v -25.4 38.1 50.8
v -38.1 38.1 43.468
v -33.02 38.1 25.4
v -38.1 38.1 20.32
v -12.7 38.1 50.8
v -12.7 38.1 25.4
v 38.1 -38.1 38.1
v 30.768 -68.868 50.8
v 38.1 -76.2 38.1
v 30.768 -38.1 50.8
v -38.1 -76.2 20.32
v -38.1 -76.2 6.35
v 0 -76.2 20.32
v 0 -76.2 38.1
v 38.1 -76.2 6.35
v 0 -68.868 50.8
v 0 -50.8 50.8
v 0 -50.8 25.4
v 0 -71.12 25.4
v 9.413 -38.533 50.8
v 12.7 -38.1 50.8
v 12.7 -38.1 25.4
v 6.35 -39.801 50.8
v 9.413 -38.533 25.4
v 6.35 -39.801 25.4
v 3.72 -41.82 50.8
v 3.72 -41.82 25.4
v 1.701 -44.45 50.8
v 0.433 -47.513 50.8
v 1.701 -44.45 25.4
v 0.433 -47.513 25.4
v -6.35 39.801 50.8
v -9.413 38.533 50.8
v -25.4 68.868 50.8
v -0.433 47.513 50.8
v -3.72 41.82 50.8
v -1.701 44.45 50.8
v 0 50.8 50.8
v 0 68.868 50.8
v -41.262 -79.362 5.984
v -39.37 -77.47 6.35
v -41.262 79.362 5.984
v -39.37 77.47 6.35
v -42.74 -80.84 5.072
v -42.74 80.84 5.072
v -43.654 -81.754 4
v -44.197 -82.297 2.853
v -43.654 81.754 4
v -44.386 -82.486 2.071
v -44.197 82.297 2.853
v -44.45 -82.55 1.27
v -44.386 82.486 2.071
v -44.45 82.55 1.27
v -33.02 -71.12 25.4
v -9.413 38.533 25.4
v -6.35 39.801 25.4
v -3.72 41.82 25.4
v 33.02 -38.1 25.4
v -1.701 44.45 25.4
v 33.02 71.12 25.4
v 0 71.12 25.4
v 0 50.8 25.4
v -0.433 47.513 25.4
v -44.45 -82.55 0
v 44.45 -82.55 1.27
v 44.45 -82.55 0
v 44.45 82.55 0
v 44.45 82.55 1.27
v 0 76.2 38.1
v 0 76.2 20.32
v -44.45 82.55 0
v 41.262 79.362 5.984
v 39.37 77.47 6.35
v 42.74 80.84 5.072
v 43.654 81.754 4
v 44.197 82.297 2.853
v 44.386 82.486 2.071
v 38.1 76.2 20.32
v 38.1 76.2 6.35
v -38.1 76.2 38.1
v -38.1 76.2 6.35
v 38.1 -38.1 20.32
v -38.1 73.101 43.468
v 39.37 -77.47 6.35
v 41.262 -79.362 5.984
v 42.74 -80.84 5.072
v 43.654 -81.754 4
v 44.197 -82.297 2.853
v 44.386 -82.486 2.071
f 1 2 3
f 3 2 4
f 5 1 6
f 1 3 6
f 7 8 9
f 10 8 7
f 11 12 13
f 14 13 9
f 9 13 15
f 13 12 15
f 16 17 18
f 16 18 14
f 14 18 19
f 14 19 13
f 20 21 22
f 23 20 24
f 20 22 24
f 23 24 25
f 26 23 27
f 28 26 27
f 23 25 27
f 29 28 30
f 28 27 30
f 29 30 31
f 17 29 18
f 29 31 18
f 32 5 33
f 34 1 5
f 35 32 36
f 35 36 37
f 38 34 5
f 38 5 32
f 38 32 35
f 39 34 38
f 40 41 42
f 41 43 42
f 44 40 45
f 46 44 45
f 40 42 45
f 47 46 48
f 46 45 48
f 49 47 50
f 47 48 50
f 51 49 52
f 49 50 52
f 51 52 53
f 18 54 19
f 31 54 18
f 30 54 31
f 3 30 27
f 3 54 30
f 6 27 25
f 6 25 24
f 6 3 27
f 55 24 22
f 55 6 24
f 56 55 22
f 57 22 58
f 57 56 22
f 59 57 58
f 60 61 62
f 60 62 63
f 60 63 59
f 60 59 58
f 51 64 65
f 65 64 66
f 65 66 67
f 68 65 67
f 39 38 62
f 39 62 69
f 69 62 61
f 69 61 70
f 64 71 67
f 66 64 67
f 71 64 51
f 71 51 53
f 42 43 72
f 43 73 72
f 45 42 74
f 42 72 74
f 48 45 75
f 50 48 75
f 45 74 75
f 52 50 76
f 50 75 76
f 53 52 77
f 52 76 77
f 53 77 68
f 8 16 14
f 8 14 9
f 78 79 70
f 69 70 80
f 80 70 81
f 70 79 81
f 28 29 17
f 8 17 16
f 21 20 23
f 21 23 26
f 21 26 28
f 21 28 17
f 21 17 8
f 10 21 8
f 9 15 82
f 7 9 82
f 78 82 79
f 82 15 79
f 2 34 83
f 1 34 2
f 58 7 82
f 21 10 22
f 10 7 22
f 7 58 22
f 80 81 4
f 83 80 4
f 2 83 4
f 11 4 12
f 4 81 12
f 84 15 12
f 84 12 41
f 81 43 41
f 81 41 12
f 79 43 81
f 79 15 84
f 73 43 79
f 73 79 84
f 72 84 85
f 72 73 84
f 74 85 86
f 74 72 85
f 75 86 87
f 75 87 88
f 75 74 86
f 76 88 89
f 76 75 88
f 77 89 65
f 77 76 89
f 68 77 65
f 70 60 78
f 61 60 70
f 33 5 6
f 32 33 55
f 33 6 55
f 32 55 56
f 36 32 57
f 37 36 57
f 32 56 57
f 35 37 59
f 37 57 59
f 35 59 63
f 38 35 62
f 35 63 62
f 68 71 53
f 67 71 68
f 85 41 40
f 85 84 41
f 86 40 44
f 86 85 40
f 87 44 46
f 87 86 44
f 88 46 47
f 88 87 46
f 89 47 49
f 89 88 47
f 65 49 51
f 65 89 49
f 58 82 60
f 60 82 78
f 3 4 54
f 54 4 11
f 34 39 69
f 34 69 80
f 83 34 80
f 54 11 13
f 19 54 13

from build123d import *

# Parameters (mm, degrees)
F0_W        = 88.9
F0_H        = 165.1
F1_DEPTH    = 6.35
F2_DEPTH    = 25.4
F3_SIZE     = 5.08
F4_DEPTH    = 50.8
F5_R        = 5.08
F6_C1_SIZE2 = 12.7
F6_C1_SIZE  = 7.3323484187
F6_C2_SIZE2 = 7.3323484187
F6_C2_SIZE  = 12.7
F6_C3_SIZE2 = 7.3323484187
F6_C3_SIZE  = 12.7
F6_C4_SIZE2 = 7.3323484187
F6_C4_SIZE  = 12.7


with BuildPart() as f1:
    # F0 (on Top) → F1 (new body)
    with BuildSketch(Plane.XY):
        Rectangle(F0_W, F0_H)
        Polygon((-38.1, 38.1), (-38.1, 76.2), (0, 76.2), (38.1, 76.2), (38.1, -38.1), (38.1, -76.2), (0, -76.2), (-38.1, -76.2), align=None, mode=Mode.SUBTRACT)
    extrude(amount=F1_DEPTH)

    # F0 (on Top) → F2 (join)
    with BuildSketch(Plane.XY):
        with BuildLine():
            Line((38.1, 76.2), (0, 76.2))
            Line((0, 76.2), (0, 50.8))
            ThreePointArc((0, 50.8), (-3.7197438789, 41.8197438789), (-12.7, 38.1))
            Line((-12.7, 38.1), (-38.1, 38.1))
            Line((-38.1, 38.1), (-38.1, -76.2))
            Line((-38.1, -76.2), (0, -76.2))
            Line((0, -76.2), (0, -50.8))
            ThreePointArc((0, -50.8), (3.7197438789, -41.8197438789), (12.7, -38.1))
            Line((12.7, -38.1), (38.1, -38.1))
            Line((38.1, -38.1), (38.1, 76.2))
        make_face()
    extrude(amount=F2_DEPTH)

    # F3
    f3_edges = [f1.edges().sort_by_distance(p)[0] for p in [
        (-38.1, -19.05, 25.4),
        (-19.05, -76.2, 25.4),
        (38.1, 19.05, 25.4),
        (19.05, 76.2, 25.4),
    ]]
    chamfer(f3_edges, length=F3_SIZE)

    # F0 (on Top) → F4 (join)
    with BuildSketch(Plane.XY):
        with BuildLine():
            Line((38.1, -76.2), (38.1, -38.1))
            Line((38.1, -38.1), (12.7, -38.1))
            ThreePointArc((12.7, -38.1), (3.7197438789, -41.8197438789), (0, -50.8))
            Line((0, -50.8), (0, -76.2))
            Line((0, -76.2), (38.1, -76.2))
        make_face()
        with BuildLine():
            Line((0, 76.2), (-38.1, 76.2))
            Line((-38.1, 76.2), (-38.1, 38.1))
            Line((-38.1, 38.1), (-12.7, 38.1))
            ThreePointArc((-12.7, 38.1), (-3.7197438789, 41.8197438789), (0, 50.8))
            Line((0, 50.8), (0, 76.2))
        make_face()
    extrude(amount=F4_DEPTH)

    # F5
    f5_edges = [f1.edges().sort_by_distance(p)[0] for p in [
        (0, 82.55, 6.35),
        (-44.45, 0, 6.35),
        (0, -82.55, 6.35),
        (44.45, 0, 6.35),
    ]]
    fillet(f5_edges, radius=F5_R)

    # F6: chamfer of 12.7 x 7.3323484187 on 4 edges, made by hand

    # F6_c1
    f6_c1_edges = [f1.edges().sort_by_distance(p)[0] for p in [
        (-38.1, 57.15, 50.8),
    ]]
    f6_c1_side = f1.faces().sort_by_distance((-38.1, 57.15, 50.6533530316))[0]
    chamfer(f6_c1_edges, length=F6_C1_SIZE, length2=F6_C1_SIZE2, reference=f6_c1_side)

    # F6_c2
    f6_c2_edges = [f1.edges().sort_by_distance(p)[0] for p in [
        (-12.7, 76.2, 50.8),
    ]]
    f6_c2_side = f1.faces().sort_by_distance((-12.7, 76.2, 50.6533530316))[0]
    chamfer(f6_c2_edges, length=F6_C2_SIZE, length2=F6_C2_SIZE2, reference=f6_c2_side)

    # F6_c3
    f6_c3_edges = [f1.edges().sort_by_distance(p)[0] for p in [
        (38.1, -57.15, 50.8),
    ]]
    f6_c3_side = f1.faces().sort_by_distance((38.1, -57.15, 50.6533530316))[0]
    chamfer(f6_c3_edges, length=F6_C3_SIZE, length2=F6_C3_SIZE2, reference=f6_c3_side)

    # F6_c4
    f6_c4_edges = [f1.edges().sort_by_distance(p)[0] for p in [
        (15.3838257906, -76.2, 50.8),
    ]]
    f6_c4_side = f1.faces().sort_by_distance((15.3838257906, -76.2, 50.6533530316))[0]
    chamfer(f6_c4_edges, length=F6_C4_SIZE, length2=F6_C4_SIZE2, reference=f6_c4_side)


solid = f1.part
